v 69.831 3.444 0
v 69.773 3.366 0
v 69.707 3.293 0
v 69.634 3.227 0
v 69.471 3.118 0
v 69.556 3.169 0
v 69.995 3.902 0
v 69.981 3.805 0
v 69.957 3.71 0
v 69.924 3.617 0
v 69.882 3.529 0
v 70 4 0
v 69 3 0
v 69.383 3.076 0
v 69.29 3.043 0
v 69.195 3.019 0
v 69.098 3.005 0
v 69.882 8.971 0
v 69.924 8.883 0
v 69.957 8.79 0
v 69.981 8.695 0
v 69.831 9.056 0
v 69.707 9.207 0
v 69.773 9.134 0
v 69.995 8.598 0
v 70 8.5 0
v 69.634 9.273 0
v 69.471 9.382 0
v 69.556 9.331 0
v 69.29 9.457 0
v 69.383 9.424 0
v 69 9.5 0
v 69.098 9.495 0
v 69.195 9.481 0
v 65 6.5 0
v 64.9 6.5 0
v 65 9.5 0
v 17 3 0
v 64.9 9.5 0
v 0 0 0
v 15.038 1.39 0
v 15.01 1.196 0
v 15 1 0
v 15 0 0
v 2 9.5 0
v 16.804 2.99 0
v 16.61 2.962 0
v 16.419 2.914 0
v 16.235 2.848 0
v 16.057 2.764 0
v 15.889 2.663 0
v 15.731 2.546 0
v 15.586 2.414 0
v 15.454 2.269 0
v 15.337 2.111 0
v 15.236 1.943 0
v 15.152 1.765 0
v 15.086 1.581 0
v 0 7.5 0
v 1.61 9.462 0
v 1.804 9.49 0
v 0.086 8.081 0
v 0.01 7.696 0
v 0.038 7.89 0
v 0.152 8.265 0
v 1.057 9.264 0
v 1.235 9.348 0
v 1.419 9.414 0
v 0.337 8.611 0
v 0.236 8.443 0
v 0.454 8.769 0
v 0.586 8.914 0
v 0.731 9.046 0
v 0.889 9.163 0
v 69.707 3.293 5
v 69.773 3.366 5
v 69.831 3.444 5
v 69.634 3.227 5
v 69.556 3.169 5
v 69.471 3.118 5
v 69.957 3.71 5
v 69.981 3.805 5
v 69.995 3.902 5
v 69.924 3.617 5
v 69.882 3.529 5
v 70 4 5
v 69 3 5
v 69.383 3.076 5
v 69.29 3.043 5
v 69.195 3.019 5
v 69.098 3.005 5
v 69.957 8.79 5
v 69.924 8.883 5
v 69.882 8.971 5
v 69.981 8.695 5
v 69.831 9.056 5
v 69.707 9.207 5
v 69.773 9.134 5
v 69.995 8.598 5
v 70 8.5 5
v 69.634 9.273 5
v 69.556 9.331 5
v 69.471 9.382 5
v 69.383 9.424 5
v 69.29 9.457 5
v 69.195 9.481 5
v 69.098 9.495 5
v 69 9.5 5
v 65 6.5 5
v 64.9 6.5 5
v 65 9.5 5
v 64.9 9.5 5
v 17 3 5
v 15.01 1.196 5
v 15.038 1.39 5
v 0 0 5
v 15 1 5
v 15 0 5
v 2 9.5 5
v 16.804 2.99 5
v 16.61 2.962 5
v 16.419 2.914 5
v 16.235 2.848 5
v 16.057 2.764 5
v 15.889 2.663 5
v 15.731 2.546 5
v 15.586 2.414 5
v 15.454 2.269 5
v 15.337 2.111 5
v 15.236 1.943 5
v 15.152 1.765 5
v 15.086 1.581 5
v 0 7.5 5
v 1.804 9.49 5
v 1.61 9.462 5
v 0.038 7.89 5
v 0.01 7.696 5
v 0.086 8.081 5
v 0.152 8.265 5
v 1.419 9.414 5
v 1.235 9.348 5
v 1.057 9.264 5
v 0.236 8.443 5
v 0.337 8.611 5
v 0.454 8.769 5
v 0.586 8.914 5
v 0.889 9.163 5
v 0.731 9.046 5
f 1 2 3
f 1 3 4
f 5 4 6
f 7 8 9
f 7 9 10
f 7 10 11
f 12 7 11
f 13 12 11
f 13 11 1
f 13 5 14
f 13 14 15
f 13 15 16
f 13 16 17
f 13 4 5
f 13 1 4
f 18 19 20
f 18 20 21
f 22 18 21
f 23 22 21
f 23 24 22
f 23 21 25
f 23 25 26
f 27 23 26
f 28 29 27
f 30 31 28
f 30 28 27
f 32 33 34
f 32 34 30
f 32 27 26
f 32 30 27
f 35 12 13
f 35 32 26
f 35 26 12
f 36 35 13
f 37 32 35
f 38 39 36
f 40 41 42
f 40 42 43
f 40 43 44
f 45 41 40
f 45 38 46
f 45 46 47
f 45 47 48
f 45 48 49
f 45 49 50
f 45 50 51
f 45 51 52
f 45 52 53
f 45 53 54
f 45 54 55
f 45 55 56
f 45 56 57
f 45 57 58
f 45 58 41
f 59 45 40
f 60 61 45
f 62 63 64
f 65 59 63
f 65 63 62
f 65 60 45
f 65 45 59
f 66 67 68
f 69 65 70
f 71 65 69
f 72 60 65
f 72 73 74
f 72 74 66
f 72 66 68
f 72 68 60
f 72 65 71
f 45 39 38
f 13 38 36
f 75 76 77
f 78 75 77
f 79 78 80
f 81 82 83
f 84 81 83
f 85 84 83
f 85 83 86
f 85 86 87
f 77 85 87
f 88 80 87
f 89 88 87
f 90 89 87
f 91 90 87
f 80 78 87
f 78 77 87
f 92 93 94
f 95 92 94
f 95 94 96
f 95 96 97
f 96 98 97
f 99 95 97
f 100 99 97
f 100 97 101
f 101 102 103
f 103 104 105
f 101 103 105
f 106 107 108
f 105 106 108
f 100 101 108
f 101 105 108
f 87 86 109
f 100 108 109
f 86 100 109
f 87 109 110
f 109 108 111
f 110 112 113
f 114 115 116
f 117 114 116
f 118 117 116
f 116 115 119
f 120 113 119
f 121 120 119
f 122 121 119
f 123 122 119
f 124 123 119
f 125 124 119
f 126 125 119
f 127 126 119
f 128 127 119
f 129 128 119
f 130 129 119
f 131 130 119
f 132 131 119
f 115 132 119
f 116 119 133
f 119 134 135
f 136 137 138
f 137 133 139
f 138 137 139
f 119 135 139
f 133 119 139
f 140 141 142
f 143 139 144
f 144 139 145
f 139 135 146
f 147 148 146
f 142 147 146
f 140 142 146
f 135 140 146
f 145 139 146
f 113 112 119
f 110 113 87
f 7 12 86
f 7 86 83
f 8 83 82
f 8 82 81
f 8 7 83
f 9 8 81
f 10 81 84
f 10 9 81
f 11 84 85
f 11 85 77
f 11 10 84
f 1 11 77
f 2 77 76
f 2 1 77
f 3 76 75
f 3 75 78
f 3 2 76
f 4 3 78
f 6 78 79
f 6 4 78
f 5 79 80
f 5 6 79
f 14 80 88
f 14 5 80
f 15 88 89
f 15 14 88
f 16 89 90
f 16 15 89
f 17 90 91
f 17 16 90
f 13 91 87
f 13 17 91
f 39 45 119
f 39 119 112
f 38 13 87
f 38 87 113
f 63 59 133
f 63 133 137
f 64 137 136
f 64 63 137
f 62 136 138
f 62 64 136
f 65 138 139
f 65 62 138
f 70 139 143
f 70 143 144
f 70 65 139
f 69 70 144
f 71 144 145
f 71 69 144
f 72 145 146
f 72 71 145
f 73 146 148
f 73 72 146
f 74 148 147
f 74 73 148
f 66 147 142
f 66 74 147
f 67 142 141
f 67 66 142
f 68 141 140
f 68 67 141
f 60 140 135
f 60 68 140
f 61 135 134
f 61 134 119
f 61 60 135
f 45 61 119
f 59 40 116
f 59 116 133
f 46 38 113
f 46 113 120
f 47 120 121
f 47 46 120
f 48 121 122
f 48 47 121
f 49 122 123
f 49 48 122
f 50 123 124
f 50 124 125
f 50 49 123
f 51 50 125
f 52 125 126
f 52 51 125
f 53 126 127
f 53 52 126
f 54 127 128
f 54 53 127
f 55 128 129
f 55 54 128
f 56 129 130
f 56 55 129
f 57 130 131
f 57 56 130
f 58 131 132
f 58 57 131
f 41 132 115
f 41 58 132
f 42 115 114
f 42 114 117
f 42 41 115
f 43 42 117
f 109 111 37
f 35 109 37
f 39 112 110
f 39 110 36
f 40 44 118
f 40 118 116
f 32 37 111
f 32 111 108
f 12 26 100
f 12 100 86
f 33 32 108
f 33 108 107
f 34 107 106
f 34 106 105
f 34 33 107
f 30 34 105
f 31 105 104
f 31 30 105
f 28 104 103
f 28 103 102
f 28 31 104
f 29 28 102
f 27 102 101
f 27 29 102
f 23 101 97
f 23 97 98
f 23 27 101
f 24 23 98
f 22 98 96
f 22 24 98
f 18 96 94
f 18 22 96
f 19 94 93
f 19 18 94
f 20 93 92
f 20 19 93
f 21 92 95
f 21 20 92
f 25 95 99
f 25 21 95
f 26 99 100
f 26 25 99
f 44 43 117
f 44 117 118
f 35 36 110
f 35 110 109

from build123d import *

# Parameters (mm, degrees)
BOSS_EXTRUDE1_DEPTH = 5
SKETCH3_W           = 0.1
SKETCH3_H           = 5
CUT_EXTRUDE1_DEPTH  = 3


with BuildPart() as part:
    # Sketch1 → Boss-Extrude1 (new body)
    with BuildSketch(Plane.XY):
        with BuildLine():
            Line((0, 0), (0, 7.5))
            ThreePointArc((0, 7.5), (0.585786438, 8.914213562), (2, 9.5))
            Line((2, 9.5), (69, 9.5))
            ThreePointArc((69, 9.5), (69.707106781, 9.207106781), (70, 8.5))
            Line((70, 8.5), (70, 4))
            ThreePointArc((70, 4), (69.707106781, 3.292893219), (69, 3))
            Line((69, 3), (17, 3))
            ThreePointArc((17, 3), (15.585786438, 2.414213562), (15, 1))
            Line((15, 1), (15, 0))
            Line((15, 0), (11, 0))
            Line((11, 0), (4, 0))
            Line((4, 0), (0, 0))
        make_face()
    extrude(amount=BOSS_EXTRUDE1_DEPTH)

    # Sketch3 → Cut-Extrude1 (cut)
    with BuildSketch(Plane(origin=(0, 9.5, 0), x_dir=(1, 0, 0), z_dir=(0, 1, 0))):
        with Locations((64.95, -2.5)):
            Rectangle(SKETCH3_W, SKETCH3_H)
    extrude(amount=-CUT_EXTRUDE1_DEPTH, mode=Mode.SUBTRACT)


solid = part.part
